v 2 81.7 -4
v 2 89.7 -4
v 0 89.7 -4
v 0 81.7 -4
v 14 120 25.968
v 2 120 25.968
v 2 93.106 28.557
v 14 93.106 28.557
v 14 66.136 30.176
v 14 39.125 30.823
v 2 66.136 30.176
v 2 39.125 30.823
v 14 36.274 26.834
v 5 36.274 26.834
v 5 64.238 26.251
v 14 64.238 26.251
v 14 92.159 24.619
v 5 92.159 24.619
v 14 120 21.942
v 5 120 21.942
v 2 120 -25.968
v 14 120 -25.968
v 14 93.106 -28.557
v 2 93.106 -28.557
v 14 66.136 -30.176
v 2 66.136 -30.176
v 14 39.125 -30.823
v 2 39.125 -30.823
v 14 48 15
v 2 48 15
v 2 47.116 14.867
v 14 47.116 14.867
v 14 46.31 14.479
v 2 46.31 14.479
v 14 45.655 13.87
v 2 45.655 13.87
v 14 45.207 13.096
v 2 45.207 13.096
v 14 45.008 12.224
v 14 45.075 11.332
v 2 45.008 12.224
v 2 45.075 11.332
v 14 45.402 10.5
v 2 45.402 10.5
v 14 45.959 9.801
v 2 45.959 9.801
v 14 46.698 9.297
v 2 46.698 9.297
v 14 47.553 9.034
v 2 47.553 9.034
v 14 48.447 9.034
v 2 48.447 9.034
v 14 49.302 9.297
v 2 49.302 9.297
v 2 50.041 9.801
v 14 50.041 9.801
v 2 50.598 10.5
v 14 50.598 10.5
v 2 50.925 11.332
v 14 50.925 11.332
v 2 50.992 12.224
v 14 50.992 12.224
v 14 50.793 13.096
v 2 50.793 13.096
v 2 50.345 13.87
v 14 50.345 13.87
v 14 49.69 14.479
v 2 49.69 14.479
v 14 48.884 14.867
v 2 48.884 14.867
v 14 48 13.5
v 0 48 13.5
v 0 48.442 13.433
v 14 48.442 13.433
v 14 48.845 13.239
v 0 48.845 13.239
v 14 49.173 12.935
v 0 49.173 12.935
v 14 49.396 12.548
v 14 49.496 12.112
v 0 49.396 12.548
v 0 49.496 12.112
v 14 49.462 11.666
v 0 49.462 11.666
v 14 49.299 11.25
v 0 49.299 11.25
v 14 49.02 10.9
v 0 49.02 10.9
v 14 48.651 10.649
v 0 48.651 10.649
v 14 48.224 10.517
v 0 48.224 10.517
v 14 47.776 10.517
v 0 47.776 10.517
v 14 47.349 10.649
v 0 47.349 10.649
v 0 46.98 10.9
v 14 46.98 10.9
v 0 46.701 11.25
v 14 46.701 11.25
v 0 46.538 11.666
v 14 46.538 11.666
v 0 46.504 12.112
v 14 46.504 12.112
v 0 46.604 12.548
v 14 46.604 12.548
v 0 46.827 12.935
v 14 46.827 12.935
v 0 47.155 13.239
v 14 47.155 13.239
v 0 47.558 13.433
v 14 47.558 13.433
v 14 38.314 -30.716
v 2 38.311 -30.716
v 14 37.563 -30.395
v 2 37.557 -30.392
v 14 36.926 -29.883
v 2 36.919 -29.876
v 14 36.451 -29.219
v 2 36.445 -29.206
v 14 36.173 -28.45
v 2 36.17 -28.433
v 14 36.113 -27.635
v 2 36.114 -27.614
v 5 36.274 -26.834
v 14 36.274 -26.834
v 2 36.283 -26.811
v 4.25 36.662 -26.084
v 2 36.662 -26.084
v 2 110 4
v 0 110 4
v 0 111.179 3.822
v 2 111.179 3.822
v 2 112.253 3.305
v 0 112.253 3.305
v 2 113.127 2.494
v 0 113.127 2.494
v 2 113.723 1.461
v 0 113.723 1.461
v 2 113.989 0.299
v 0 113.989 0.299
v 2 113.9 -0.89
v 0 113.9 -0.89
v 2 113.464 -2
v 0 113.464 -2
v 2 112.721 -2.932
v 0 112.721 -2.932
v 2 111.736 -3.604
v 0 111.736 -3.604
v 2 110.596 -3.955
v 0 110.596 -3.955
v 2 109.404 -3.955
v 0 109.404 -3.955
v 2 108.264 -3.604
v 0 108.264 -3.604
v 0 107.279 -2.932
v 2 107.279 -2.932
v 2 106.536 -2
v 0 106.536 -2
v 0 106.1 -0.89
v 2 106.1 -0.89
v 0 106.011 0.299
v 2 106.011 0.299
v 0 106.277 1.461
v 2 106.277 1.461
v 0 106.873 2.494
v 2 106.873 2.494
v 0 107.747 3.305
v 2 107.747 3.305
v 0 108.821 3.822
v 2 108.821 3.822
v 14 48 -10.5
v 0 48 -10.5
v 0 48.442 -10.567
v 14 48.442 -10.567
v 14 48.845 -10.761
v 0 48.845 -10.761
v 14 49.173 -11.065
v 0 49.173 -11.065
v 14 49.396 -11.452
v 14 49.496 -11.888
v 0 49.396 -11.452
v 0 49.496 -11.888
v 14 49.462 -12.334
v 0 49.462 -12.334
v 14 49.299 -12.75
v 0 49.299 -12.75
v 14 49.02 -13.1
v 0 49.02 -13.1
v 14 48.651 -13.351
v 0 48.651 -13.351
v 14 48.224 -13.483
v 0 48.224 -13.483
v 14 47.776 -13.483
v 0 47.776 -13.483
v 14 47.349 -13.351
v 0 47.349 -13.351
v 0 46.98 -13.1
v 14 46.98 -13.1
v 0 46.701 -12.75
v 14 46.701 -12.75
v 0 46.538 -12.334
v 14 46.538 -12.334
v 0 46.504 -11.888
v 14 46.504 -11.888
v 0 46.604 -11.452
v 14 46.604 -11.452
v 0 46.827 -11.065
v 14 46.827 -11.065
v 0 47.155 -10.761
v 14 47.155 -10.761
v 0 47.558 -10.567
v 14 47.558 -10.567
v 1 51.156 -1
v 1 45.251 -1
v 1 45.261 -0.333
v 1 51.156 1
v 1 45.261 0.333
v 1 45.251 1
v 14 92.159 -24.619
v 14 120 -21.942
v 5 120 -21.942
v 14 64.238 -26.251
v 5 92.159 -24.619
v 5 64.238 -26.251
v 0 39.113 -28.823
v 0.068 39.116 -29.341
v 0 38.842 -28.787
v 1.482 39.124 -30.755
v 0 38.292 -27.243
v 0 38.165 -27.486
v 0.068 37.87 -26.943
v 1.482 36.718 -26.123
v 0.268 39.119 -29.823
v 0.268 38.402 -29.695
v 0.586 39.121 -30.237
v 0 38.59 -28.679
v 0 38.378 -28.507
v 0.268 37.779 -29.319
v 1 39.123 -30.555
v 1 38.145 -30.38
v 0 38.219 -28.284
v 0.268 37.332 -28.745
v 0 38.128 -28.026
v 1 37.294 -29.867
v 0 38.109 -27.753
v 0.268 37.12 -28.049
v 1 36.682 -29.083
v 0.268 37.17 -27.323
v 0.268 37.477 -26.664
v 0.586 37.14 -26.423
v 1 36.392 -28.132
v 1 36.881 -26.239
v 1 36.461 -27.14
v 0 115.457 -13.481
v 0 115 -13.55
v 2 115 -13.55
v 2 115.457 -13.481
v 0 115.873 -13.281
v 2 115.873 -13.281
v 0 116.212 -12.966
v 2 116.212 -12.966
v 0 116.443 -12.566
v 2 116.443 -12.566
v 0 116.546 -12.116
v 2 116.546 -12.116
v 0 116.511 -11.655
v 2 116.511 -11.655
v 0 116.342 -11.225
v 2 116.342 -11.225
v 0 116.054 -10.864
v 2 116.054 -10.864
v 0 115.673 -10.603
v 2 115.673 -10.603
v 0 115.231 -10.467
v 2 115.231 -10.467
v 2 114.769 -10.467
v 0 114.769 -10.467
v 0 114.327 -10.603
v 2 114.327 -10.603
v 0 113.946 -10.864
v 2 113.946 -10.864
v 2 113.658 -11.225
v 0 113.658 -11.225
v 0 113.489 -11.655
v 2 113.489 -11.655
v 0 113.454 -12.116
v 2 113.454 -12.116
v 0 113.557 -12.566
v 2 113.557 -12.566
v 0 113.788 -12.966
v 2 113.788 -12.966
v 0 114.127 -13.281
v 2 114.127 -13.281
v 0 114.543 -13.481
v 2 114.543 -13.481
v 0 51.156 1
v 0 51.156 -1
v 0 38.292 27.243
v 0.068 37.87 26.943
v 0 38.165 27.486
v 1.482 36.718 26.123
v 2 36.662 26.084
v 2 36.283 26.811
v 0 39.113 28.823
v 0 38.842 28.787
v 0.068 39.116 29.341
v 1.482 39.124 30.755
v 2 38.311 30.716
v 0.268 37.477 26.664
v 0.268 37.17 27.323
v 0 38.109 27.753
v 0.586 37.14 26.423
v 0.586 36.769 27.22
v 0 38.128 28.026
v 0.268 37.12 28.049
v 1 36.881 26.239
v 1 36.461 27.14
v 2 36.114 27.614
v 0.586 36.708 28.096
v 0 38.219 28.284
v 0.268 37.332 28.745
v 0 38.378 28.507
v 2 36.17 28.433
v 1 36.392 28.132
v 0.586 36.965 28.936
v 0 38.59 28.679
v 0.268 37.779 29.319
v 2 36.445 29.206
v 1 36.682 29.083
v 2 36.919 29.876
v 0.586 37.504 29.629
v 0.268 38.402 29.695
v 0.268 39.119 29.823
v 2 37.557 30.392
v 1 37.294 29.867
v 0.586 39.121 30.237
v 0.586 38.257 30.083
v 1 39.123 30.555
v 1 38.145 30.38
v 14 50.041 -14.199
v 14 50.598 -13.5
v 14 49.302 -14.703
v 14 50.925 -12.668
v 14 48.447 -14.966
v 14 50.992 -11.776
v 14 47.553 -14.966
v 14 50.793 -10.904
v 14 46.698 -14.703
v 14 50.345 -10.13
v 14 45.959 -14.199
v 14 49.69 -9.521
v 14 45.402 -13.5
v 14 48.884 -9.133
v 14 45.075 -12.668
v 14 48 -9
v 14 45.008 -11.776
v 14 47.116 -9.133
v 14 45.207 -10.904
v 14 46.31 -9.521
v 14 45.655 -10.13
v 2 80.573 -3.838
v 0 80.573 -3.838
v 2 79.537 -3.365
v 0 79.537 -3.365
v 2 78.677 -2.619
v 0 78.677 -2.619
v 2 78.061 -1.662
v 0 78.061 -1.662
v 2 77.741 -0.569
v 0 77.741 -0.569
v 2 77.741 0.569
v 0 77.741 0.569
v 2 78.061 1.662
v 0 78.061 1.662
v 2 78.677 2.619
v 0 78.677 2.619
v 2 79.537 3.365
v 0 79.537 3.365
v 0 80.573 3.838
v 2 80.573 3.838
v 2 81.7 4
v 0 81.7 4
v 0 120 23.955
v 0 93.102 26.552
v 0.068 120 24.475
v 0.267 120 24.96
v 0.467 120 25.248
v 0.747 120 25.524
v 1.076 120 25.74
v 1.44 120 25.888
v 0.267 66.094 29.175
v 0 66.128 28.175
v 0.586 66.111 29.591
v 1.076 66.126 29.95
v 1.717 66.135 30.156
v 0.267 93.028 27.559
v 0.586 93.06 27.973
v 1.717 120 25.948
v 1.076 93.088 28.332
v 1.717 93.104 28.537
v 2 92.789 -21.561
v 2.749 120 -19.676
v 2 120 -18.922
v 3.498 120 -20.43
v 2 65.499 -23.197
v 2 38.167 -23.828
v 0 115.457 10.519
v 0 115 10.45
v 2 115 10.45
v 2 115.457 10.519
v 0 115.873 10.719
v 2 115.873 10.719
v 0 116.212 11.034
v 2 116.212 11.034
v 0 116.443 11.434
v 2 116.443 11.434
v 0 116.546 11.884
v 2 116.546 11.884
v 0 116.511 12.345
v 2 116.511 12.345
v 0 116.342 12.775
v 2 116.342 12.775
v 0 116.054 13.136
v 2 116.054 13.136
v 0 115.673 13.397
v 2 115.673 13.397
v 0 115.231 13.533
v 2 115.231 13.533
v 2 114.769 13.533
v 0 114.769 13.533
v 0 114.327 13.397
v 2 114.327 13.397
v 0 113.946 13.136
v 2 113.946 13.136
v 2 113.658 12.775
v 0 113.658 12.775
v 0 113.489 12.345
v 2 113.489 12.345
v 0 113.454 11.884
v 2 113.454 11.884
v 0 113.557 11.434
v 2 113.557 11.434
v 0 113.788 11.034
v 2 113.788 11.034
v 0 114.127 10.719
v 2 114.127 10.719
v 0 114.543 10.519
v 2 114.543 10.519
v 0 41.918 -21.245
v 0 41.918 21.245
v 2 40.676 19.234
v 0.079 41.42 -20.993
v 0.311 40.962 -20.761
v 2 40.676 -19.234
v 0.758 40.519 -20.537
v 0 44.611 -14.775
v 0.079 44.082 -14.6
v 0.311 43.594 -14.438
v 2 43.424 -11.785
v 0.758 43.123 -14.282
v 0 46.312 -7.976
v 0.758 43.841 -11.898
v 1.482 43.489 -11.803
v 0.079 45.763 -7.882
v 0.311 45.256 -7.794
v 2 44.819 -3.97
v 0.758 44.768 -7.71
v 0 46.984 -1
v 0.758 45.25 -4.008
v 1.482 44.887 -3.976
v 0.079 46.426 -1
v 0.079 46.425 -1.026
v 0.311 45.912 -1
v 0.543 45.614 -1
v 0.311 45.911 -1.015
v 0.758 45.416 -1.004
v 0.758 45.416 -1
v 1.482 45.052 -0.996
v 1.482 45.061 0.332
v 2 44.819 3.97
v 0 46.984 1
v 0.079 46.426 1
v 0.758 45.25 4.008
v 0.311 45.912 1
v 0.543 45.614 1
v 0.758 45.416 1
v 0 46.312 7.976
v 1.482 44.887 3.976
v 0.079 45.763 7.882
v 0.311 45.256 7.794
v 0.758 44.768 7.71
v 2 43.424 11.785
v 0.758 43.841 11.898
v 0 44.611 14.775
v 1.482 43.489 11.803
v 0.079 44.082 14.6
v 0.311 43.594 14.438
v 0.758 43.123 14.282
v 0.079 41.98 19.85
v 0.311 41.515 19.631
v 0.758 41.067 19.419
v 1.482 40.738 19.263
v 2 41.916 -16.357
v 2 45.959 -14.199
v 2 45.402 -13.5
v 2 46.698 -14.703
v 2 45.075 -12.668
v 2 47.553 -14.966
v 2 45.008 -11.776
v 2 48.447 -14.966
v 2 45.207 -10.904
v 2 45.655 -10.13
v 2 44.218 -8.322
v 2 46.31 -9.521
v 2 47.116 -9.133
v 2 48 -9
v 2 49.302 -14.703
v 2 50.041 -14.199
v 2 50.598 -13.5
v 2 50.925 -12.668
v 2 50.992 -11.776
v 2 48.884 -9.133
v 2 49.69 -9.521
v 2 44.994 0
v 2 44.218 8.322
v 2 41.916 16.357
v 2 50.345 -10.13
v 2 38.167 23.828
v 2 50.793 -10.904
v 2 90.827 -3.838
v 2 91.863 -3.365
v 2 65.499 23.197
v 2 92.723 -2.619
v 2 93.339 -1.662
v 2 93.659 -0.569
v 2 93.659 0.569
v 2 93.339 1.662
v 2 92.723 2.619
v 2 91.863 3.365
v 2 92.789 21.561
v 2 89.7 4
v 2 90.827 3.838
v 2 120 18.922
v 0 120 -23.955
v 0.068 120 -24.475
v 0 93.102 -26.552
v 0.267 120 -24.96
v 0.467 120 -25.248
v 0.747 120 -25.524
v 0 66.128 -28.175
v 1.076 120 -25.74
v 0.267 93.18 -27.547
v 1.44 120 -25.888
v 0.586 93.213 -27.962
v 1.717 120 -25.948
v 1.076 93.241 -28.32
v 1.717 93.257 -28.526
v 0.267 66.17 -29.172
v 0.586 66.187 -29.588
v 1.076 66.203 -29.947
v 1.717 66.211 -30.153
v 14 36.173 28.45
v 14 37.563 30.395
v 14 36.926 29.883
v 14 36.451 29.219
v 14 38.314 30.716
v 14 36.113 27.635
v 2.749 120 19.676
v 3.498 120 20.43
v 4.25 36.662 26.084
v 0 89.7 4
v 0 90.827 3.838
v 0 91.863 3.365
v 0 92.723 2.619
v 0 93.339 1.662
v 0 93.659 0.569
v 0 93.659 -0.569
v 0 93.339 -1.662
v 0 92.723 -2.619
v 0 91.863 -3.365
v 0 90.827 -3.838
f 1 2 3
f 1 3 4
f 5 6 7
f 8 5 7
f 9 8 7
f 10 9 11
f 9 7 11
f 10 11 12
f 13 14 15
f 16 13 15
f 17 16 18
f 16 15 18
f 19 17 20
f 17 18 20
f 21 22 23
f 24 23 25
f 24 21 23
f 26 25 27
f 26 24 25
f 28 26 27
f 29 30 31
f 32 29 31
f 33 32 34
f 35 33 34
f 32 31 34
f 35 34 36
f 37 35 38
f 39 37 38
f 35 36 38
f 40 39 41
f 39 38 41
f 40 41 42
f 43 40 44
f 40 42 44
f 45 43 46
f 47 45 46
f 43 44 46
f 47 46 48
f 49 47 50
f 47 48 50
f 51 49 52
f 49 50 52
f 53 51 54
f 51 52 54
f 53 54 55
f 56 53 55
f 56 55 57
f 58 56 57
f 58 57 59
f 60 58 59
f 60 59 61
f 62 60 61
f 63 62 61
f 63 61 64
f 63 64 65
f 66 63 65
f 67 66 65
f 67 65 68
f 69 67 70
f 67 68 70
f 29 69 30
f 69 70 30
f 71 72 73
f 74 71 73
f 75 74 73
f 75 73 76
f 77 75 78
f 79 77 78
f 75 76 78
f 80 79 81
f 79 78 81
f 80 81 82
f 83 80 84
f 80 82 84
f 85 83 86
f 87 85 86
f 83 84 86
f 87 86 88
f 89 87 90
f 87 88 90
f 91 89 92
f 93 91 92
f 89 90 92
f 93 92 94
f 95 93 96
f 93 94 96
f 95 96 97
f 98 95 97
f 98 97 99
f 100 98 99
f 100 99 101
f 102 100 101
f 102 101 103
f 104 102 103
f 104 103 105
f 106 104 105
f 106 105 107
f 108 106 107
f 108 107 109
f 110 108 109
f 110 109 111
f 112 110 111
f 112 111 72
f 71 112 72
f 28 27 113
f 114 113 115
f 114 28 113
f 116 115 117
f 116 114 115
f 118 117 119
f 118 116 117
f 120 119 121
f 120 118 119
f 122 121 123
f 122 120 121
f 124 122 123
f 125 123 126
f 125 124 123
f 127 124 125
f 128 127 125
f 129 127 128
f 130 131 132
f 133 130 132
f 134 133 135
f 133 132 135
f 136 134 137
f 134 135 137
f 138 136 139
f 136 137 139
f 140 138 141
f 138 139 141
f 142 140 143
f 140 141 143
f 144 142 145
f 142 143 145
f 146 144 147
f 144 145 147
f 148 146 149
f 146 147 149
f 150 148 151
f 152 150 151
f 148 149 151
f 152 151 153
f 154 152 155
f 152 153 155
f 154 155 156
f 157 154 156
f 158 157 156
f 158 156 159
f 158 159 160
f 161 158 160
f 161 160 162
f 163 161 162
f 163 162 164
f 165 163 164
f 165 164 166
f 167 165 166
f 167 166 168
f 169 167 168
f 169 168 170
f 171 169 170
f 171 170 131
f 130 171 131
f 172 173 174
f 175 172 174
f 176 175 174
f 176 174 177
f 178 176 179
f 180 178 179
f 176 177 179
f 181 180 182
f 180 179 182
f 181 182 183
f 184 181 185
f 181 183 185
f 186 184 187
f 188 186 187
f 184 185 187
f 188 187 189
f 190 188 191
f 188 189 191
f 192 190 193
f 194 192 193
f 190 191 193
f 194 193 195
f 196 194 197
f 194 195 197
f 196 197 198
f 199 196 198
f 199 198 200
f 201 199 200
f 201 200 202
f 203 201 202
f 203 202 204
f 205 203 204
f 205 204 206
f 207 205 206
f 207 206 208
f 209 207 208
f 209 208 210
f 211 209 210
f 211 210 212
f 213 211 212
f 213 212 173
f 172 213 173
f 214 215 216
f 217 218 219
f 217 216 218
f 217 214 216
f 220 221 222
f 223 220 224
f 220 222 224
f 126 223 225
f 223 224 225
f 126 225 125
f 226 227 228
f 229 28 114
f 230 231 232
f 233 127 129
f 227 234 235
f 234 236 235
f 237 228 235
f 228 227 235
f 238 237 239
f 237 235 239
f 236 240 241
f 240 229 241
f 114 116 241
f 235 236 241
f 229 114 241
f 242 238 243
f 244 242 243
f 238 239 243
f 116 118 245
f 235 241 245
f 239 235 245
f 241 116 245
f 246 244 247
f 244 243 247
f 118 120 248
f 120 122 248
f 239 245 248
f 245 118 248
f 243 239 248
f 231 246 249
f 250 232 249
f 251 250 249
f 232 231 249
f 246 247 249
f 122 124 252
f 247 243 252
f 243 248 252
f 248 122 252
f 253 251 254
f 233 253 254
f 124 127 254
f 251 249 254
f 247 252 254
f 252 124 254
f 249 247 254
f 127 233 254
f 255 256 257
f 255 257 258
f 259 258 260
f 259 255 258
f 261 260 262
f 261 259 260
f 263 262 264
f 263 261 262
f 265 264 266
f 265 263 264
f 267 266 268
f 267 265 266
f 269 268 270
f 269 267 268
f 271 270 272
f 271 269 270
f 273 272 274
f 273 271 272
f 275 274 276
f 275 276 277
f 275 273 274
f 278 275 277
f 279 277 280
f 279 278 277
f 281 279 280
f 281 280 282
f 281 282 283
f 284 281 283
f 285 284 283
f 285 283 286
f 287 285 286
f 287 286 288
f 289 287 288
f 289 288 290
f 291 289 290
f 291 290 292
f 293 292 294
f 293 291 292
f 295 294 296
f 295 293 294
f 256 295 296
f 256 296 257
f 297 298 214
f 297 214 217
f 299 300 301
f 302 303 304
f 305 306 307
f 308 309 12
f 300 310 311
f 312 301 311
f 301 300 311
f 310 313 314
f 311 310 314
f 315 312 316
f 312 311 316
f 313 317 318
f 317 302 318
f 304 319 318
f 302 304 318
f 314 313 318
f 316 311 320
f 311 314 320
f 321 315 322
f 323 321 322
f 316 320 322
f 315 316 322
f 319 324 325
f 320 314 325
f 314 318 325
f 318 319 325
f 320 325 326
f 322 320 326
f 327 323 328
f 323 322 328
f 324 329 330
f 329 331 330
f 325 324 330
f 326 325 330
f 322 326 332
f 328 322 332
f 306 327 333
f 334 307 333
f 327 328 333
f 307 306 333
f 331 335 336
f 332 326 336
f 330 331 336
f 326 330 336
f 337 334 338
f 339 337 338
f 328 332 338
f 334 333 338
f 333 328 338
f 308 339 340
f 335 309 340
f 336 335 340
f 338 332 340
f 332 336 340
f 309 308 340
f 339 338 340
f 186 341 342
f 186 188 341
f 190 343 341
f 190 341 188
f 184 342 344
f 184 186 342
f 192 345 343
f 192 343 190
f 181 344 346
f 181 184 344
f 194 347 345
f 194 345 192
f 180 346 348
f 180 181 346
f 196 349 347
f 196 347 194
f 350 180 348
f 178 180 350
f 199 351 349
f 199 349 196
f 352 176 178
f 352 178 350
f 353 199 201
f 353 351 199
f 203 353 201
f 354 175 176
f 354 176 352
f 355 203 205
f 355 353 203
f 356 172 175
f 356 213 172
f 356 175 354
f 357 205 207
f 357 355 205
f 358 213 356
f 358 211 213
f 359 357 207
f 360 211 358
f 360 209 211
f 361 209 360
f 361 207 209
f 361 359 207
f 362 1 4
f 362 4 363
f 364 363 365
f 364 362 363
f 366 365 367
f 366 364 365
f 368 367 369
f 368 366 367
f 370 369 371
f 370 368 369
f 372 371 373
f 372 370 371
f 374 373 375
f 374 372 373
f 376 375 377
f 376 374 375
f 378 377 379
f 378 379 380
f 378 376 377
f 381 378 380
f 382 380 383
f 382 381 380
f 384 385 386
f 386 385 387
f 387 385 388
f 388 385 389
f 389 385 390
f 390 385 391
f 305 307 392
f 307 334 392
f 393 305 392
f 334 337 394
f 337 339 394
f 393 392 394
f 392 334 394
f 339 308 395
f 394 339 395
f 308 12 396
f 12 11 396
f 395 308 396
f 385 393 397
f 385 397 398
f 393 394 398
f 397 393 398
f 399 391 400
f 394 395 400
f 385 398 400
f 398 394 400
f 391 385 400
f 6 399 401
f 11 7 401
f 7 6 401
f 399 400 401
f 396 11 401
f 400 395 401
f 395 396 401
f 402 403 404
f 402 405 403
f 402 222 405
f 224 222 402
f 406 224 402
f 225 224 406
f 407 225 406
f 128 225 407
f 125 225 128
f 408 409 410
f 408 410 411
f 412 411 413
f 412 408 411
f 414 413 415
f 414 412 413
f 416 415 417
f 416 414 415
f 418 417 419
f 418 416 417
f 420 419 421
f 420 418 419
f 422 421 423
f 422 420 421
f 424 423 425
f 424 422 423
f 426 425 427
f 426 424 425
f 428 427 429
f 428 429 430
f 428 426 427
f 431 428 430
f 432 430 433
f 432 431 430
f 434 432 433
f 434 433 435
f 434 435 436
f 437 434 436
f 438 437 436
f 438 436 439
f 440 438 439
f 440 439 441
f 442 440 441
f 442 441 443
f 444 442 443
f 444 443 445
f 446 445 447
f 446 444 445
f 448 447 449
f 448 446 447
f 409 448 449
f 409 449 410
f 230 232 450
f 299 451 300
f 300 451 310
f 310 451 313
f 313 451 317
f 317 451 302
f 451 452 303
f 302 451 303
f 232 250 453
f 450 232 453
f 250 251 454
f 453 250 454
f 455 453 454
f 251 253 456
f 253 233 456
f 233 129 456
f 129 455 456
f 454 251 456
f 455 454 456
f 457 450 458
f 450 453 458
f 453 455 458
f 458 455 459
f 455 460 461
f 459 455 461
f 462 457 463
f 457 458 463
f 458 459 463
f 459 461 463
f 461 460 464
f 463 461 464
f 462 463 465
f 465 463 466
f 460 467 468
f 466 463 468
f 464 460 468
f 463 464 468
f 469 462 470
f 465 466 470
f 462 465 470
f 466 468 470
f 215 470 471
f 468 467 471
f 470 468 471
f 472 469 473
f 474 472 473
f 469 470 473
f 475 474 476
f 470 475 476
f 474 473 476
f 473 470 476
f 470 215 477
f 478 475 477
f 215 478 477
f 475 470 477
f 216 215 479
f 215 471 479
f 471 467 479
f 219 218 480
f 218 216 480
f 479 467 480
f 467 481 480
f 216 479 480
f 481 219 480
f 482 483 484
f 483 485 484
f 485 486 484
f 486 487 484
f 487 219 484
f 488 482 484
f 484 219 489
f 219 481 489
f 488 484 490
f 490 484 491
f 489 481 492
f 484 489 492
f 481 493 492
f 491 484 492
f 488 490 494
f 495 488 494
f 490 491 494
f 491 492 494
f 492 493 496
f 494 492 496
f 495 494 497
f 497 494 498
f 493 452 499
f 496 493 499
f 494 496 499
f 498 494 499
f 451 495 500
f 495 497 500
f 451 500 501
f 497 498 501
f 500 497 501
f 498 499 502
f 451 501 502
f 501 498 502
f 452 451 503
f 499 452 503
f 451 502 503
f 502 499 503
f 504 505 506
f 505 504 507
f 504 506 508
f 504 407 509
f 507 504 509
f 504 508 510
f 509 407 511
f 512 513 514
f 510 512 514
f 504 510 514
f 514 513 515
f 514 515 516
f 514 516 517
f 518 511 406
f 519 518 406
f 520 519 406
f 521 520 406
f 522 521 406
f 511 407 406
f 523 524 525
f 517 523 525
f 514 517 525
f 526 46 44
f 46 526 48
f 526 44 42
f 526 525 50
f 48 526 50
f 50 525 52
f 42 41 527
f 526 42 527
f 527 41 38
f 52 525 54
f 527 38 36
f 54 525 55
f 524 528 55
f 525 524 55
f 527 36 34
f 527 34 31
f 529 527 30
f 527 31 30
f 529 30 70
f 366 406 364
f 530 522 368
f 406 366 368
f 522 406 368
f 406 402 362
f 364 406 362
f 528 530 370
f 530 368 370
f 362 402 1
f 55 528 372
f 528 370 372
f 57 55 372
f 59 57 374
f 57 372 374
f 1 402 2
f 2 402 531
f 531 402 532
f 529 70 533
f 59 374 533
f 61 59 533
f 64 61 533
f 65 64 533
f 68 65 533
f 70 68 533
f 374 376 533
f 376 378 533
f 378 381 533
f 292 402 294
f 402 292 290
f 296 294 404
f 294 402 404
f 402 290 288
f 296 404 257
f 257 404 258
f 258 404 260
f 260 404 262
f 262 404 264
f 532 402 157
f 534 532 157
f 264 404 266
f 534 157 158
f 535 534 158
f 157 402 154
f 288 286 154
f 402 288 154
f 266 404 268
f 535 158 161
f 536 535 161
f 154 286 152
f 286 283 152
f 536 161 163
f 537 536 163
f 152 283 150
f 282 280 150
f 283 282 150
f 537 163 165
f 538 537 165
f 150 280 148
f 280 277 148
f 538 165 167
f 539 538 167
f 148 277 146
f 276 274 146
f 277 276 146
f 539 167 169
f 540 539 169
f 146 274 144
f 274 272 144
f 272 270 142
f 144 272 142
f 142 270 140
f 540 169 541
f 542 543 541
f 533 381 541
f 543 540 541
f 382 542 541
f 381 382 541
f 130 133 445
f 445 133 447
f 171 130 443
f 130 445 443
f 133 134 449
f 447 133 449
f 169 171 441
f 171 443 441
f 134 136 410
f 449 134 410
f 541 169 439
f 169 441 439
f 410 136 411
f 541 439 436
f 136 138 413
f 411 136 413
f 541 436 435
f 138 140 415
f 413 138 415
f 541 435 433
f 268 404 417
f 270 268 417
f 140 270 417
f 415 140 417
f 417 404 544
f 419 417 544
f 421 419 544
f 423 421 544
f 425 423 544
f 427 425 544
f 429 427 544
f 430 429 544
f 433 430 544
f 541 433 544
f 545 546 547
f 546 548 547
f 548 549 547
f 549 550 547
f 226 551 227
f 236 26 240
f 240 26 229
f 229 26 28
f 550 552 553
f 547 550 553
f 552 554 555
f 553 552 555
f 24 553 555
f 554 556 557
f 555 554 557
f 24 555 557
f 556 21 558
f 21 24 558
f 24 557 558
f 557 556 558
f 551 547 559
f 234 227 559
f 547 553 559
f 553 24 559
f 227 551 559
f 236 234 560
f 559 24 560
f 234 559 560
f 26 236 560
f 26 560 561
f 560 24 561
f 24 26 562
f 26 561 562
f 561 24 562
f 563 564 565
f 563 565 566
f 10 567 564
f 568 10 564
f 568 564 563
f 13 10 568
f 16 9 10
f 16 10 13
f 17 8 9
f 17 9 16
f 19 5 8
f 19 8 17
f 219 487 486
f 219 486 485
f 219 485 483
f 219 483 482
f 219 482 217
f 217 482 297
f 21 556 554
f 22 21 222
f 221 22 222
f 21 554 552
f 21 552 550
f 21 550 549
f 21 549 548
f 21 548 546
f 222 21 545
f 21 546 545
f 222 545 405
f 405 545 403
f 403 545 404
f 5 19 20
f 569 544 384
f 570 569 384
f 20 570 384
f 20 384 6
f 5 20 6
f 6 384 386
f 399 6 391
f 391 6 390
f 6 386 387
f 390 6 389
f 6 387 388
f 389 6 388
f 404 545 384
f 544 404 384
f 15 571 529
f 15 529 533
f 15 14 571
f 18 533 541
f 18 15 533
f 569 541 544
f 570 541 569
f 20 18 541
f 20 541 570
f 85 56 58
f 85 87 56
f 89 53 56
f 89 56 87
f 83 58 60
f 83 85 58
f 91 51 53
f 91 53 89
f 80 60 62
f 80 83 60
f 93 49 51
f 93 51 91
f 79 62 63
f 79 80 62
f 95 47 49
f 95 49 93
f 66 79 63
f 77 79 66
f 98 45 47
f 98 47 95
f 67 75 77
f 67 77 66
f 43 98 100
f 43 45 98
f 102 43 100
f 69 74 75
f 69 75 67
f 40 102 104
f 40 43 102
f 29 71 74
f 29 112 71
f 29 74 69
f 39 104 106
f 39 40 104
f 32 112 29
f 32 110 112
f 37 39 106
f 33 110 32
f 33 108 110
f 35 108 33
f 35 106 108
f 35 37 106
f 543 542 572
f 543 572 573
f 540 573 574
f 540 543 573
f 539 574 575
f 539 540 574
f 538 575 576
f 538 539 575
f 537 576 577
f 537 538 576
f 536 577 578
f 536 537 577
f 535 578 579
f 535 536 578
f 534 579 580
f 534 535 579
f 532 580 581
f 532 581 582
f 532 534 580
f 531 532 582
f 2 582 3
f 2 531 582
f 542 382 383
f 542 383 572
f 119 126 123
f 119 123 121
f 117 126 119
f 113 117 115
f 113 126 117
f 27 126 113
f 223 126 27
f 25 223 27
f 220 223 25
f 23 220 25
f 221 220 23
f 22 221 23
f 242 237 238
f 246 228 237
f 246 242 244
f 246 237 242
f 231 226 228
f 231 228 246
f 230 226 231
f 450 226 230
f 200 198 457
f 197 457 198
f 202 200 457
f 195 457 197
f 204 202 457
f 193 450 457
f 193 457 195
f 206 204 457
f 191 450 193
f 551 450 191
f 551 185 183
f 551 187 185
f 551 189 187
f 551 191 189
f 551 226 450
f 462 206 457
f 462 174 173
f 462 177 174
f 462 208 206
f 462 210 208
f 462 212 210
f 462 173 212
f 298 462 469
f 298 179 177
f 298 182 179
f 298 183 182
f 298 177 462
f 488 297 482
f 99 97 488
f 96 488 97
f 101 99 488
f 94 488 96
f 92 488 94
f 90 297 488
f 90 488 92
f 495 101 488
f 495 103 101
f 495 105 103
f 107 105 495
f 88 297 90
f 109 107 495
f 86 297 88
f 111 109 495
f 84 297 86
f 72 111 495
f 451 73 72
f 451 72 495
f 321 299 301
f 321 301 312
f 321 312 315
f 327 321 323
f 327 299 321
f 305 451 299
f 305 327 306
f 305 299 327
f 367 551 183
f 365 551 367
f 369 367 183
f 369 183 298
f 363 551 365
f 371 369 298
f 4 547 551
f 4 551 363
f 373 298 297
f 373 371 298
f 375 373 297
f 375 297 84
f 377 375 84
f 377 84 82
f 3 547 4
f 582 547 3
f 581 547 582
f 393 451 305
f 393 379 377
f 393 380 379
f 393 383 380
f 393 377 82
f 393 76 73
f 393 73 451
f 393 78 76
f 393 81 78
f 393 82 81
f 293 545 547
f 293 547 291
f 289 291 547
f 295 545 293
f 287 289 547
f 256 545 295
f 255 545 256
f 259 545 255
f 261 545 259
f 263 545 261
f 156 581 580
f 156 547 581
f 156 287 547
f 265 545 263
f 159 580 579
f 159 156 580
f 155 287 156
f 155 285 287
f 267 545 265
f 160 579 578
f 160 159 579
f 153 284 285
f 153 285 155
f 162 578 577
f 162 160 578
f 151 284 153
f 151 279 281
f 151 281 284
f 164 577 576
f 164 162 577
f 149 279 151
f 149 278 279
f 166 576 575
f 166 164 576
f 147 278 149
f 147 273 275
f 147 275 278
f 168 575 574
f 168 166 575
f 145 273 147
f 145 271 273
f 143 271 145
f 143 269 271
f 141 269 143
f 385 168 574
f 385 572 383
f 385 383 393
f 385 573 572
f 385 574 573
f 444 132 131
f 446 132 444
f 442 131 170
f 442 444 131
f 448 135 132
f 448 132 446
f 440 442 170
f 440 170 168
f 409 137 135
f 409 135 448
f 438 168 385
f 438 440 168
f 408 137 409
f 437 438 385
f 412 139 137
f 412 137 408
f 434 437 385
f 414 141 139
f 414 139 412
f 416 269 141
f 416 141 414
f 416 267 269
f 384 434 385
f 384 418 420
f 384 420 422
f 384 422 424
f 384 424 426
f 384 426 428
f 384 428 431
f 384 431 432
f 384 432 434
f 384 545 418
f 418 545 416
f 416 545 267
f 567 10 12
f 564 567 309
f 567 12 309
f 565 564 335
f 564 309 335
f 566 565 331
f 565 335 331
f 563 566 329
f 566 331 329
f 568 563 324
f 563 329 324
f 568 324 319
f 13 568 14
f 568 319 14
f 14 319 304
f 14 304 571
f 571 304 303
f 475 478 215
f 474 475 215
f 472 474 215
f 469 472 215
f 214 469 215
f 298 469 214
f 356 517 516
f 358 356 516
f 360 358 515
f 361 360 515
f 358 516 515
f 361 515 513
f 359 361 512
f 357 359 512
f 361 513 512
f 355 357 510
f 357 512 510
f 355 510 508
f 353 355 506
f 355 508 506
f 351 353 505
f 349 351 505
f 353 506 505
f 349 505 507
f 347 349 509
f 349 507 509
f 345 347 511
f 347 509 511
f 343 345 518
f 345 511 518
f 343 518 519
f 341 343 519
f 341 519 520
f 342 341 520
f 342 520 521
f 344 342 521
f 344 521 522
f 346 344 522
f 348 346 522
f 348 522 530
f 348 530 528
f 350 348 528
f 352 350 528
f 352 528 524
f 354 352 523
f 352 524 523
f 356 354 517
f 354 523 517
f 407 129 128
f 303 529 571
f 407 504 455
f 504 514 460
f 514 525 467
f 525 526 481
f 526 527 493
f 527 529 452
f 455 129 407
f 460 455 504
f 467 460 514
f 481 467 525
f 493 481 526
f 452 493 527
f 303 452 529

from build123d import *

# Parameters (mm, degrees)
SKETCH1_R           = 1.5499999999999983
BOSS_EXTRUDE1_DEPTH = 2
CUT_EXTRUDE1_DEPTH  = 2
BOSS_EXTRUDE2_DEPTH = 12
SKETCH4_R           = 1.5000000000000009
CUT_EXTRUDE2_DEPTH  = 2
SKETCH_8_R          = 3
EXTRUDE_1_DEPTH     = 12
CHAMFER6_SIZE       = 3
SKETCH_1_R          = 4.0000000000000036
CUT_EXTRUDE_1_DEPTH = 10
SKETCH_9_R          = 1.5000000000000009
CUT_EXTRUDE_2_DEPTH = 125.68382559540109
FILLET_1_R          = 2
SKETCH_10_W         = 2
SKETCH_10_H         = 7.38673868931825
CUT_EXTRUDE_3_DEPTH = 1


with BuildPart() as part:
    # Sketch1 → Boss-Extrude1 (new body)
    with BuildSketch(Plane(origin=(0, 0, 0), x_dir=(0, 0, -1), z_dir=(1, 0, 0))):
        with BuildLine():
            Line((-25.968110327255765, 120.00000000000003), (25.968110327255765, 120.00000000000003))
            ThreePointArc((25.968110327255765, 120.00000000000003), (29.488419187011914, 79.62790655837495), (30.82293132778887, 39.124603227985936))
            ThreePointArc((30.82293132778887, 39.124603227985936), (29.206107258133628, 36.44471853371224), (26.083845229838534, 36.66239231138328))
            ThreePointArc((26.083845229838534, 36.66239231138328), (-6.3665e-13, 44.994421787238764), (-26.083845229839092, 36.66239231138189))
            ThreePointArc((-26.083845229839092, 36.66239231138189), (-29.20610725813421, 36.44471853371079), (-30.82293132778949, 39.1246032279845))
            ThreePointArc((-30.82293132778949, 39.1246032279845), (-29.488419187012596, 79.6279065583745), (-25.968110327255765, 120.00000000000003))
        make_face()
        with Locations((-11.999999999999995, 115)):
            Circle(SKETCH1_R, mode=Mode.SUBTRACT)
        with Locations((12.000000000000005, 115)):
            Circle(SKETCH1_R, mode=Mode.SUBTRACT)
    extrude(amount=BOSS_EXTRUDE1_DEPTH)

    # Sketch2 → Cut-Extrude1 (cut)
    with BuildSketch(Plane(origin=(2, 0, 0), x_dir=(0, 0, -1), z_dir=(1, 0, 0))):
        with BuildLine():
            Line((4, 89.70000000000002), (4.000000000000003, 81.7))
            ThreePointArc((4.000000000000003, 81.7), (1.16e-15, 77.7), (-4.000000000000001, 81.7))
            Line((-4.000000000000001, 81.7), (-4.0000000000000036, 89.70000000000002))
            ThreePointArc((-4.0000000000000036, 89.70000000000002), (-3.1e-16, 93.70000000000002), (4, 89.70000000000002))
        make_face()
    extrude(amount=-CUT_EXTRUDE1_DEPTH, mode=Mode.SUBTRACT)

    # Sketch3 → Boss-Extrude2 (add)
    with BuildSketch(Plane(origin=(2, 0, 0), x_dir=(0, 0, -1), z_dir=(1, 0, 0))):
        with BuildLine():
            Line((-21.94183683045926, 120.00000000000003), (-25.968110327255765, 120.00000000000003))
            ThreePointArc((-25.968110327255772, 120.00000000000003), (-29.488419187012482, 79.6279065583743), (-30.82293132778932, 39.124603227984586))
            ThreePointArc((-30.822931327789238, 39.1246032279846), (-29.56718535087633, 36.66600228940771), (-26.834368801169504, 36.274428235935545))
            ThreePointArc((-26.83436880116949, 36.27442823593551), (-25.56563052181184, 78.20602334586083), (-21.941836830459124, 120.00000000000003))
        make_face()
        with BuildLine():
            Line((25.968110327255545, 119.99999999999999), (21.941836830459355, 119.99999999999999))
            ThreePointArc((21.94183683045935, 120.00000000000006), (25.565630521812068, 78.20602334586118), (26.834368801169717, 36.27442823593619))
            ThreePointArc((26.834368801169717, 36.27442823593619), (29.567185350876464, 36.66600228940895), (30.822931327789195, 39.124603227985936))
            ThreePointArc((30.822931327789092, 39.124603227985936), (29.48841918701214, 79.62790655837497), (25.96811032725543, 119.99999999999999))
        make_face()
    extrude(amount=BOSS_EXTRUDE2_DEPTH)

    # Sketch4 → Cut-Extrude2 (cut)
    with BuildSketch(Plane.ZY):
        with Locations((-12, 48)):
            Circle(SKETCH4_R)
        with Locations((12, 48)):
            Circle(SKETCH4_R)
    extrude(amount=-CUT_EXTRUDE2_DEPTH, mode=Mode.SUBTRACT)

    # 草图8 → 凸台-拉伸1 (add)
    with BuildSketch(Plane(origin=(2, 0, 0), x_dir=(0, 0, -1), z_dir=(1, 0, 0))):
        with Locations(Location((-12, 48, 0), (0, 0, 180))):
            Circle(SKETCH_8_R)
        with Locations(Location((12, 48, 0), (0, 0, 180))):
            Circle(SKETCH_8_R)
    extrude(amount=EXTRUDE_1_DEPTH)

    # Chamfer6
    chamfer6_edges = [part.edges().sort_by_distance(p)[0] for p in [
        (2, 78.20602334586118, -25.565630521811954),
        (2, 78.20602334586081, 25.565630521811727),
    ]]
    chamfer(chamfer6_edges, length=CHAMFER6_SIZE)

    # 草图1 → 切除-拉伸1 (cut)
    with BuildSketch(Plane.ZY):
        with Locations((0, 110.00000000000003)):
            Circle(SKETCH_1_R)
    extrude(amount=-CUT_EXTRUDE_1_DEPTH, mode=Mode.SUBTRACT)

    # 草图9 → 切除-拉伸2 (cut, through all)
    with BuildSketch(Plane.ZY):
        with Locations((-12, 48)):
            Circle(SKETCH_9_R)
        with Locations((12, 48)):
            Circle(SKETCH_9_R)
    extrude(amount=-CUT_EXTRUDE_2_DEPTH, mode=Mode.SUBTRACT)

    # 圆角1
    fillet_1_edges = [part.edges().sort_by_distance(p)[0] for p in [
        (0, 44.994421787238764, 4.9916e-13),
        (0, 36.44471853371079, 29.20610725813421),
        (0, 79.62790655837429, 29.488419187012596),
        (0, 79.62790655837495, -29.4884191870118),
        (0, 36.44471853371224, -29.206107258133624),
    ]]
    fillet(fillet_1_edges, radius=FILLET_1_R - 0.0001)  # a hair under: the kernel refuses the full size

    # 草图10 → 切除-拉伸3 (cut)
    with BuildSketch(Plane.ZY):
        with Locations((0, 47.46265164885683)):
            Rectangle(SKETCH_10_W, SKETCH_10_H)
    extrude(amount=-CUT_EXTRUDE_3_DEPTH, mode=Mode.SUBTRACT)


solid = part.part
